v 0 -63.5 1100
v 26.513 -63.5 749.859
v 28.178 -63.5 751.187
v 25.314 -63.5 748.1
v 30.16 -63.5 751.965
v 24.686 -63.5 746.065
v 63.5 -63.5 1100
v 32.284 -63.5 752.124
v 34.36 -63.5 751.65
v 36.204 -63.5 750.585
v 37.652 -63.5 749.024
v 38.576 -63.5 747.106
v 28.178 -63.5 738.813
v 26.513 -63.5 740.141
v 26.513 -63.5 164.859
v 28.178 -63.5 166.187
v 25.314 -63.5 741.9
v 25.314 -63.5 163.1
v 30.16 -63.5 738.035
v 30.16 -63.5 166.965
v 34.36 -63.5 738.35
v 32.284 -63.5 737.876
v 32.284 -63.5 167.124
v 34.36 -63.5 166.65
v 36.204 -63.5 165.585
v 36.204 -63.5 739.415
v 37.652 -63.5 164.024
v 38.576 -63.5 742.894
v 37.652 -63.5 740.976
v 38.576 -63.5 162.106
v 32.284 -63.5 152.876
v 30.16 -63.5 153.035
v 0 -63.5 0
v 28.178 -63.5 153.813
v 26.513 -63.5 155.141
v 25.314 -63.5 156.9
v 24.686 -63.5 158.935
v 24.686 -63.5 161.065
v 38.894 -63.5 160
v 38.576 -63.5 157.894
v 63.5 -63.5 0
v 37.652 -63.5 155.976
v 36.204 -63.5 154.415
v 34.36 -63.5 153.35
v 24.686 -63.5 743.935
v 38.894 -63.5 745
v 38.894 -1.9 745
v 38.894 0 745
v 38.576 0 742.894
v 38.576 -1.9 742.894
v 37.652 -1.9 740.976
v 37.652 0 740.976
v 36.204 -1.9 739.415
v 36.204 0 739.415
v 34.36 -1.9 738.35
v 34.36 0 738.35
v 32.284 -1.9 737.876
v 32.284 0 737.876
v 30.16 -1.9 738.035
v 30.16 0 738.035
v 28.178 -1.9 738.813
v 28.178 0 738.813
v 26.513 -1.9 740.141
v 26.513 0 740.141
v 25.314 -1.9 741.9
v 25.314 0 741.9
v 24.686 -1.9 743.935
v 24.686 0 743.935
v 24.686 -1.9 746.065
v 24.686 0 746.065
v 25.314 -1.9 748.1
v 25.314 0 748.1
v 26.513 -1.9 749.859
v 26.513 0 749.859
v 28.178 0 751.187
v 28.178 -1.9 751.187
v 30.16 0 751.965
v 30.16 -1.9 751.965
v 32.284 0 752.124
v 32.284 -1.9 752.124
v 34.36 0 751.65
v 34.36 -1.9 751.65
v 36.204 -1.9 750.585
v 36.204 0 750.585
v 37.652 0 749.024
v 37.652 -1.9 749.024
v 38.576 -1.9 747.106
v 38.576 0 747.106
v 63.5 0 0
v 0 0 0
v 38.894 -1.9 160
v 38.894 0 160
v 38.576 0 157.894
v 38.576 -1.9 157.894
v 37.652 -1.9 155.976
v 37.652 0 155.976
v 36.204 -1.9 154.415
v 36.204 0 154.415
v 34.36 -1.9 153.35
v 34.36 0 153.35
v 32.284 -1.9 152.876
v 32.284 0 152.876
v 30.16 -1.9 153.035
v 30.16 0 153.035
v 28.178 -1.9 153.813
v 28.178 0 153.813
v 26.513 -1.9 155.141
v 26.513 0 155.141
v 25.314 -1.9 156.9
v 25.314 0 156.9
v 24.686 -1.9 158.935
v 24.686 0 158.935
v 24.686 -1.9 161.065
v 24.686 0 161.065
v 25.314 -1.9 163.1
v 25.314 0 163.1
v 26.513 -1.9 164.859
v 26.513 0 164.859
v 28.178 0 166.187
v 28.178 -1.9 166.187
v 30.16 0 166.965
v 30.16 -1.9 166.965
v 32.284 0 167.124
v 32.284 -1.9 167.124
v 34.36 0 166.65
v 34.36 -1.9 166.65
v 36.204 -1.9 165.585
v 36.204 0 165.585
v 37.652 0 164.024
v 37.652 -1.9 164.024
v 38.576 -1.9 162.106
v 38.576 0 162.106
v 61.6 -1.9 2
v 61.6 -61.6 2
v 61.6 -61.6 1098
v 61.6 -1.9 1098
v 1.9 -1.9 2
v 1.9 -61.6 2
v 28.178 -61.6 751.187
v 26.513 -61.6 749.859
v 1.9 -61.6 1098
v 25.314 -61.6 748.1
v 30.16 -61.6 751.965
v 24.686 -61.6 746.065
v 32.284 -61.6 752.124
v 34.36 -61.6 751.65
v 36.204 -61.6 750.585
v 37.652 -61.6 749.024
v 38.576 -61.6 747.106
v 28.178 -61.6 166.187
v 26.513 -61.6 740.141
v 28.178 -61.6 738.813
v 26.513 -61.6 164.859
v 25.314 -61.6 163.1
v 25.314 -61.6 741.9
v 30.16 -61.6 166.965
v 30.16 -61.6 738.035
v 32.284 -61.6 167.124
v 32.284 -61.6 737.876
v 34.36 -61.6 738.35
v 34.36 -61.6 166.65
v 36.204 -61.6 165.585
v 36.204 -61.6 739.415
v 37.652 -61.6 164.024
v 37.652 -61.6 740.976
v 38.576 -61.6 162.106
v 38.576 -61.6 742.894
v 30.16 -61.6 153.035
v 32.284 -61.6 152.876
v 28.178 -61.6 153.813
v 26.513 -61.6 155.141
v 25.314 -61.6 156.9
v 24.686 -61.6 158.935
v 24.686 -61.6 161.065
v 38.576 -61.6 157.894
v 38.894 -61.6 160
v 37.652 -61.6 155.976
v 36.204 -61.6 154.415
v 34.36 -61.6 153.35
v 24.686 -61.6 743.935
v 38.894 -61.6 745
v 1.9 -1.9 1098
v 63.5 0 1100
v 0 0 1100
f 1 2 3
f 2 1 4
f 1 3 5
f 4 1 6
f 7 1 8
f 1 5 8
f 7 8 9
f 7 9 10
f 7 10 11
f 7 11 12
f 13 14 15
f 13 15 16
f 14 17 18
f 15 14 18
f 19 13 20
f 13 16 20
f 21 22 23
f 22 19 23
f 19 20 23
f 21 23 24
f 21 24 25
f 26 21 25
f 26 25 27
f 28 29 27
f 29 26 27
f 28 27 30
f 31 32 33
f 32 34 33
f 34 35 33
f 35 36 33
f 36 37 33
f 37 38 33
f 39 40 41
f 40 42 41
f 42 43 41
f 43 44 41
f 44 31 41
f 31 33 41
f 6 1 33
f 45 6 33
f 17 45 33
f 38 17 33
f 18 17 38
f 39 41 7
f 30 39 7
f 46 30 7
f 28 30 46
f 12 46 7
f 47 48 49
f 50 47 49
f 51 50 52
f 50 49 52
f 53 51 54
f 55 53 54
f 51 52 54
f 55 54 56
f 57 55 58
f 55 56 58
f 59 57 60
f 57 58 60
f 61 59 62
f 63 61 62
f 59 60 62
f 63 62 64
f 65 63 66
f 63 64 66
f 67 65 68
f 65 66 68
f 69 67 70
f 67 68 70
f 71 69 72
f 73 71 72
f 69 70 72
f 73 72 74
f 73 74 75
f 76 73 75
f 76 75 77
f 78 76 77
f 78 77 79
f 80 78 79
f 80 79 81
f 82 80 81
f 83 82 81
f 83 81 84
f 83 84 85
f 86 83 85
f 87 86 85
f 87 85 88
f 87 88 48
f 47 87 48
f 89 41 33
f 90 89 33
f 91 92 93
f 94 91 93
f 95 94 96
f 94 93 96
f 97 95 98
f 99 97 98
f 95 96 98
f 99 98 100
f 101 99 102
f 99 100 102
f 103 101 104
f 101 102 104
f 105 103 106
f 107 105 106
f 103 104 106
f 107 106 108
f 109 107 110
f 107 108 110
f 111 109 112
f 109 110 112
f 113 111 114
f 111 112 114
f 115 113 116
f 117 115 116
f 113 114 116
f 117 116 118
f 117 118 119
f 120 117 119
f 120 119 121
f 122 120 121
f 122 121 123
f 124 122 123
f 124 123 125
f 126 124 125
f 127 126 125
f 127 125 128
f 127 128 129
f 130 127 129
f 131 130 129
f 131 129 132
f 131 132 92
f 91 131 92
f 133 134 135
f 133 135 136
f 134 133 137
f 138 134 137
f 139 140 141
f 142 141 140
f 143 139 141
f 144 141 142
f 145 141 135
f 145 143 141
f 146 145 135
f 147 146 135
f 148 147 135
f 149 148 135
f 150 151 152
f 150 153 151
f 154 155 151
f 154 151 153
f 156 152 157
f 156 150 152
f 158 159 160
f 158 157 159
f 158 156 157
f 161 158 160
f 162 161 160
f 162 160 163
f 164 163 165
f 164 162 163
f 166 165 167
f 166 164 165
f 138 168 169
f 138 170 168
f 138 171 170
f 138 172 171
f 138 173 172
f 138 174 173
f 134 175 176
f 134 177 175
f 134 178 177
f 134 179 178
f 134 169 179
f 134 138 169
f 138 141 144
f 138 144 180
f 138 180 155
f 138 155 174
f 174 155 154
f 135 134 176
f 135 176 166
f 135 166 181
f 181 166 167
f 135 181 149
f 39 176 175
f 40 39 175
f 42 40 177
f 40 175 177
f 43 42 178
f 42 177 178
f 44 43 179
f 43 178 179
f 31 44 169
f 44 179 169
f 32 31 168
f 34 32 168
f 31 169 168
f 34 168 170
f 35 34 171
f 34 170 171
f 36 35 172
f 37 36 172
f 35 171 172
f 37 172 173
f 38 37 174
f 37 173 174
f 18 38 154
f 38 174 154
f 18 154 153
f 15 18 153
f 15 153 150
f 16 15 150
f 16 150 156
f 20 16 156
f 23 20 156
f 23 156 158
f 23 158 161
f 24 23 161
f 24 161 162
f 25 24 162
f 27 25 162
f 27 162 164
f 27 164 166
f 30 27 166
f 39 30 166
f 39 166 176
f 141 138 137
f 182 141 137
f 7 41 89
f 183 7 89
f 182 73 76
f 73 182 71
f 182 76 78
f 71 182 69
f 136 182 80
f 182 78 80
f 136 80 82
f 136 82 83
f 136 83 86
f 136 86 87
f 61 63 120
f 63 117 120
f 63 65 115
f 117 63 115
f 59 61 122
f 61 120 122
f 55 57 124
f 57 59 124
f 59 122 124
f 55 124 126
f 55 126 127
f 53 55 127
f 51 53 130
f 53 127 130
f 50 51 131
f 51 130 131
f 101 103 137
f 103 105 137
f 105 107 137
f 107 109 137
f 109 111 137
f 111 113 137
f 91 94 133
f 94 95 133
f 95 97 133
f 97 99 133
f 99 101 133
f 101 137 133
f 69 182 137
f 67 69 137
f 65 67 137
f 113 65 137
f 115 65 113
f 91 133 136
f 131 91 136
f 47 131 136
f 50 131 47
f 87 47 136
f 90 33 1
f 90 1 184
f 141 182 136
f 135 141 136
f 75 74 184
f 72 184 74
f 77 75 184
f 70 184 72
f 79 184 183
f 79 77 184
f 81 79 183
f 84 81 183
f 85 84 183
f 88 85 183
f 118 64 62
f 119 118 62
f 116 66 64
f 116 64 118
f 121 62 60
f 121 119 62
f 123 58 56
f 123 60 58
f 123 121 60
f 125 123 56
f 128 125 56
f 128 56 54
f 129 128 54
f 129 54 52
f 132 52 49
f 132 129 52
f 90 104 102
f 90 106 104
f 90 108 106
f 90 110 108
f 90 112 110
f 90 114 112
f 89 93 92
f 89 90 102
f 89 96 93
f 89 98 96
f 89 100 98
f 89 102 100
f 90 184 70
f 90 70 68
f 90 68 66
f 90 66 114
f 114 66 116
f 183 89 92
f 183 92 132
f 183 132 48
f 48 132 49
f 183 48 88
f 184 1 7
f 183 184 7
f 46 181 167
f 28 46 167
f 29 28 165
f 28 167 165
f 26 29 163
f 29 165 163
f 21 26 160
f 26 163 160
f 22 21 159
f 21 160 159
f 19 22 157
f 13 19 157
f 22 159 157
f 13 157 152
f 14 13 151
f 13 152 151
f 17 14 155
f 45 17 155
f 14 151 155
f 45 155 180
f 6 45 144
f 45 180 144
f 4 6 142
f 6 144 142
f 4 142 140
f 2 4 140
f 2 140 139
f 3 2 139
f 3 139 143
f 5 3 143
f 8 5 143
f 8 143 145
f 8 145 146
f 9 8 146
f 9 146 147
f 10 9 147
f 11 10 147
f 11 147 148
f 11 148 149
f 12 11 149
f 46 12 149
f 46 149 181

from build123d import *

# Parameters (mm, degrees)
CROQUIS1_W              = 63.5
CROQUIS1_H              = 63.5
CROQUIS1_W_2            = 59.7
CROQUIS1_H_2            = 59.7
SALIENTE_EXTRUIR1_DEPTH = 1100
CROQUIS2_W              = 59.7
CROQUIS2_H              = 59.7
SALIENTE_EXTRUIR2_DEPTH = 2
CROQUIS3_W              = 59.7
CROQUIS3_H              = 59.7
SALIENTE_EXTRUIR3_DEPTH = 2
CROQUIS4_R              = 7.14375
CORTAR_EXTRUIR1_DEPTH   = 120


with BuildPart() as part:
    # Croquis1 → Saliente-Extruir1 (new body)
    with BuildSketch(Plane.XY):
        with Locations((31.75, -31.75)):
            Rectangle(CROQUIS1_W, CROQUIS1_H)
        with Locations((31.75, -31.75)):
            Rectangle(CROQUIS1_W_2, CROQUIS1_H_2, mode=Mode.SUBTRACT)
    extrude(amount=SALIENTE_EXTRUIR1_DEPTH)

    # Croquis2 → Saliente-Extruir2 (add)
    with BuildSketch(Plane.XY.offset(1100)):
        with Locations((31.75, -31.75)):
            Rectangle(CROQUIS2_W, CROQUIS2_H)
    extrude(amount=-SALIENTE_EXTRUIR2_DEPTH)

    # Croquis3 → Saliente-Extruir3 (add)
    with BuildSketch(Plane(origin=(0, 0, 0), x_dir=(-1, 0, 0), z_dir=(0, 0, -1))):
        with Locations((-31.75, -31.75)):
            Rectangle(CROQUIS3_W, CROQUIS3_H)
    extrude(amount=-SALIENTE_EXTRUIR3_DEPTH)

    # Croquis4 → Cortar-Extruir1 (cut)
    with BuildSketch(Plane(origin=(0, 0, 0), x_dir=(1, 0, 0), z_dir=(0, 1, 0))):
        with Locations((31.75, -160)):
            Circle(CROQUIS4_R)
        with Locations((31.75, -745)):
            Circle(CROQUIS4_R)
    extrude(amount=-CORTAR_EXTRUIR1_DEPTH, mode=Mode.SUBTRACT)


solid = part.part
